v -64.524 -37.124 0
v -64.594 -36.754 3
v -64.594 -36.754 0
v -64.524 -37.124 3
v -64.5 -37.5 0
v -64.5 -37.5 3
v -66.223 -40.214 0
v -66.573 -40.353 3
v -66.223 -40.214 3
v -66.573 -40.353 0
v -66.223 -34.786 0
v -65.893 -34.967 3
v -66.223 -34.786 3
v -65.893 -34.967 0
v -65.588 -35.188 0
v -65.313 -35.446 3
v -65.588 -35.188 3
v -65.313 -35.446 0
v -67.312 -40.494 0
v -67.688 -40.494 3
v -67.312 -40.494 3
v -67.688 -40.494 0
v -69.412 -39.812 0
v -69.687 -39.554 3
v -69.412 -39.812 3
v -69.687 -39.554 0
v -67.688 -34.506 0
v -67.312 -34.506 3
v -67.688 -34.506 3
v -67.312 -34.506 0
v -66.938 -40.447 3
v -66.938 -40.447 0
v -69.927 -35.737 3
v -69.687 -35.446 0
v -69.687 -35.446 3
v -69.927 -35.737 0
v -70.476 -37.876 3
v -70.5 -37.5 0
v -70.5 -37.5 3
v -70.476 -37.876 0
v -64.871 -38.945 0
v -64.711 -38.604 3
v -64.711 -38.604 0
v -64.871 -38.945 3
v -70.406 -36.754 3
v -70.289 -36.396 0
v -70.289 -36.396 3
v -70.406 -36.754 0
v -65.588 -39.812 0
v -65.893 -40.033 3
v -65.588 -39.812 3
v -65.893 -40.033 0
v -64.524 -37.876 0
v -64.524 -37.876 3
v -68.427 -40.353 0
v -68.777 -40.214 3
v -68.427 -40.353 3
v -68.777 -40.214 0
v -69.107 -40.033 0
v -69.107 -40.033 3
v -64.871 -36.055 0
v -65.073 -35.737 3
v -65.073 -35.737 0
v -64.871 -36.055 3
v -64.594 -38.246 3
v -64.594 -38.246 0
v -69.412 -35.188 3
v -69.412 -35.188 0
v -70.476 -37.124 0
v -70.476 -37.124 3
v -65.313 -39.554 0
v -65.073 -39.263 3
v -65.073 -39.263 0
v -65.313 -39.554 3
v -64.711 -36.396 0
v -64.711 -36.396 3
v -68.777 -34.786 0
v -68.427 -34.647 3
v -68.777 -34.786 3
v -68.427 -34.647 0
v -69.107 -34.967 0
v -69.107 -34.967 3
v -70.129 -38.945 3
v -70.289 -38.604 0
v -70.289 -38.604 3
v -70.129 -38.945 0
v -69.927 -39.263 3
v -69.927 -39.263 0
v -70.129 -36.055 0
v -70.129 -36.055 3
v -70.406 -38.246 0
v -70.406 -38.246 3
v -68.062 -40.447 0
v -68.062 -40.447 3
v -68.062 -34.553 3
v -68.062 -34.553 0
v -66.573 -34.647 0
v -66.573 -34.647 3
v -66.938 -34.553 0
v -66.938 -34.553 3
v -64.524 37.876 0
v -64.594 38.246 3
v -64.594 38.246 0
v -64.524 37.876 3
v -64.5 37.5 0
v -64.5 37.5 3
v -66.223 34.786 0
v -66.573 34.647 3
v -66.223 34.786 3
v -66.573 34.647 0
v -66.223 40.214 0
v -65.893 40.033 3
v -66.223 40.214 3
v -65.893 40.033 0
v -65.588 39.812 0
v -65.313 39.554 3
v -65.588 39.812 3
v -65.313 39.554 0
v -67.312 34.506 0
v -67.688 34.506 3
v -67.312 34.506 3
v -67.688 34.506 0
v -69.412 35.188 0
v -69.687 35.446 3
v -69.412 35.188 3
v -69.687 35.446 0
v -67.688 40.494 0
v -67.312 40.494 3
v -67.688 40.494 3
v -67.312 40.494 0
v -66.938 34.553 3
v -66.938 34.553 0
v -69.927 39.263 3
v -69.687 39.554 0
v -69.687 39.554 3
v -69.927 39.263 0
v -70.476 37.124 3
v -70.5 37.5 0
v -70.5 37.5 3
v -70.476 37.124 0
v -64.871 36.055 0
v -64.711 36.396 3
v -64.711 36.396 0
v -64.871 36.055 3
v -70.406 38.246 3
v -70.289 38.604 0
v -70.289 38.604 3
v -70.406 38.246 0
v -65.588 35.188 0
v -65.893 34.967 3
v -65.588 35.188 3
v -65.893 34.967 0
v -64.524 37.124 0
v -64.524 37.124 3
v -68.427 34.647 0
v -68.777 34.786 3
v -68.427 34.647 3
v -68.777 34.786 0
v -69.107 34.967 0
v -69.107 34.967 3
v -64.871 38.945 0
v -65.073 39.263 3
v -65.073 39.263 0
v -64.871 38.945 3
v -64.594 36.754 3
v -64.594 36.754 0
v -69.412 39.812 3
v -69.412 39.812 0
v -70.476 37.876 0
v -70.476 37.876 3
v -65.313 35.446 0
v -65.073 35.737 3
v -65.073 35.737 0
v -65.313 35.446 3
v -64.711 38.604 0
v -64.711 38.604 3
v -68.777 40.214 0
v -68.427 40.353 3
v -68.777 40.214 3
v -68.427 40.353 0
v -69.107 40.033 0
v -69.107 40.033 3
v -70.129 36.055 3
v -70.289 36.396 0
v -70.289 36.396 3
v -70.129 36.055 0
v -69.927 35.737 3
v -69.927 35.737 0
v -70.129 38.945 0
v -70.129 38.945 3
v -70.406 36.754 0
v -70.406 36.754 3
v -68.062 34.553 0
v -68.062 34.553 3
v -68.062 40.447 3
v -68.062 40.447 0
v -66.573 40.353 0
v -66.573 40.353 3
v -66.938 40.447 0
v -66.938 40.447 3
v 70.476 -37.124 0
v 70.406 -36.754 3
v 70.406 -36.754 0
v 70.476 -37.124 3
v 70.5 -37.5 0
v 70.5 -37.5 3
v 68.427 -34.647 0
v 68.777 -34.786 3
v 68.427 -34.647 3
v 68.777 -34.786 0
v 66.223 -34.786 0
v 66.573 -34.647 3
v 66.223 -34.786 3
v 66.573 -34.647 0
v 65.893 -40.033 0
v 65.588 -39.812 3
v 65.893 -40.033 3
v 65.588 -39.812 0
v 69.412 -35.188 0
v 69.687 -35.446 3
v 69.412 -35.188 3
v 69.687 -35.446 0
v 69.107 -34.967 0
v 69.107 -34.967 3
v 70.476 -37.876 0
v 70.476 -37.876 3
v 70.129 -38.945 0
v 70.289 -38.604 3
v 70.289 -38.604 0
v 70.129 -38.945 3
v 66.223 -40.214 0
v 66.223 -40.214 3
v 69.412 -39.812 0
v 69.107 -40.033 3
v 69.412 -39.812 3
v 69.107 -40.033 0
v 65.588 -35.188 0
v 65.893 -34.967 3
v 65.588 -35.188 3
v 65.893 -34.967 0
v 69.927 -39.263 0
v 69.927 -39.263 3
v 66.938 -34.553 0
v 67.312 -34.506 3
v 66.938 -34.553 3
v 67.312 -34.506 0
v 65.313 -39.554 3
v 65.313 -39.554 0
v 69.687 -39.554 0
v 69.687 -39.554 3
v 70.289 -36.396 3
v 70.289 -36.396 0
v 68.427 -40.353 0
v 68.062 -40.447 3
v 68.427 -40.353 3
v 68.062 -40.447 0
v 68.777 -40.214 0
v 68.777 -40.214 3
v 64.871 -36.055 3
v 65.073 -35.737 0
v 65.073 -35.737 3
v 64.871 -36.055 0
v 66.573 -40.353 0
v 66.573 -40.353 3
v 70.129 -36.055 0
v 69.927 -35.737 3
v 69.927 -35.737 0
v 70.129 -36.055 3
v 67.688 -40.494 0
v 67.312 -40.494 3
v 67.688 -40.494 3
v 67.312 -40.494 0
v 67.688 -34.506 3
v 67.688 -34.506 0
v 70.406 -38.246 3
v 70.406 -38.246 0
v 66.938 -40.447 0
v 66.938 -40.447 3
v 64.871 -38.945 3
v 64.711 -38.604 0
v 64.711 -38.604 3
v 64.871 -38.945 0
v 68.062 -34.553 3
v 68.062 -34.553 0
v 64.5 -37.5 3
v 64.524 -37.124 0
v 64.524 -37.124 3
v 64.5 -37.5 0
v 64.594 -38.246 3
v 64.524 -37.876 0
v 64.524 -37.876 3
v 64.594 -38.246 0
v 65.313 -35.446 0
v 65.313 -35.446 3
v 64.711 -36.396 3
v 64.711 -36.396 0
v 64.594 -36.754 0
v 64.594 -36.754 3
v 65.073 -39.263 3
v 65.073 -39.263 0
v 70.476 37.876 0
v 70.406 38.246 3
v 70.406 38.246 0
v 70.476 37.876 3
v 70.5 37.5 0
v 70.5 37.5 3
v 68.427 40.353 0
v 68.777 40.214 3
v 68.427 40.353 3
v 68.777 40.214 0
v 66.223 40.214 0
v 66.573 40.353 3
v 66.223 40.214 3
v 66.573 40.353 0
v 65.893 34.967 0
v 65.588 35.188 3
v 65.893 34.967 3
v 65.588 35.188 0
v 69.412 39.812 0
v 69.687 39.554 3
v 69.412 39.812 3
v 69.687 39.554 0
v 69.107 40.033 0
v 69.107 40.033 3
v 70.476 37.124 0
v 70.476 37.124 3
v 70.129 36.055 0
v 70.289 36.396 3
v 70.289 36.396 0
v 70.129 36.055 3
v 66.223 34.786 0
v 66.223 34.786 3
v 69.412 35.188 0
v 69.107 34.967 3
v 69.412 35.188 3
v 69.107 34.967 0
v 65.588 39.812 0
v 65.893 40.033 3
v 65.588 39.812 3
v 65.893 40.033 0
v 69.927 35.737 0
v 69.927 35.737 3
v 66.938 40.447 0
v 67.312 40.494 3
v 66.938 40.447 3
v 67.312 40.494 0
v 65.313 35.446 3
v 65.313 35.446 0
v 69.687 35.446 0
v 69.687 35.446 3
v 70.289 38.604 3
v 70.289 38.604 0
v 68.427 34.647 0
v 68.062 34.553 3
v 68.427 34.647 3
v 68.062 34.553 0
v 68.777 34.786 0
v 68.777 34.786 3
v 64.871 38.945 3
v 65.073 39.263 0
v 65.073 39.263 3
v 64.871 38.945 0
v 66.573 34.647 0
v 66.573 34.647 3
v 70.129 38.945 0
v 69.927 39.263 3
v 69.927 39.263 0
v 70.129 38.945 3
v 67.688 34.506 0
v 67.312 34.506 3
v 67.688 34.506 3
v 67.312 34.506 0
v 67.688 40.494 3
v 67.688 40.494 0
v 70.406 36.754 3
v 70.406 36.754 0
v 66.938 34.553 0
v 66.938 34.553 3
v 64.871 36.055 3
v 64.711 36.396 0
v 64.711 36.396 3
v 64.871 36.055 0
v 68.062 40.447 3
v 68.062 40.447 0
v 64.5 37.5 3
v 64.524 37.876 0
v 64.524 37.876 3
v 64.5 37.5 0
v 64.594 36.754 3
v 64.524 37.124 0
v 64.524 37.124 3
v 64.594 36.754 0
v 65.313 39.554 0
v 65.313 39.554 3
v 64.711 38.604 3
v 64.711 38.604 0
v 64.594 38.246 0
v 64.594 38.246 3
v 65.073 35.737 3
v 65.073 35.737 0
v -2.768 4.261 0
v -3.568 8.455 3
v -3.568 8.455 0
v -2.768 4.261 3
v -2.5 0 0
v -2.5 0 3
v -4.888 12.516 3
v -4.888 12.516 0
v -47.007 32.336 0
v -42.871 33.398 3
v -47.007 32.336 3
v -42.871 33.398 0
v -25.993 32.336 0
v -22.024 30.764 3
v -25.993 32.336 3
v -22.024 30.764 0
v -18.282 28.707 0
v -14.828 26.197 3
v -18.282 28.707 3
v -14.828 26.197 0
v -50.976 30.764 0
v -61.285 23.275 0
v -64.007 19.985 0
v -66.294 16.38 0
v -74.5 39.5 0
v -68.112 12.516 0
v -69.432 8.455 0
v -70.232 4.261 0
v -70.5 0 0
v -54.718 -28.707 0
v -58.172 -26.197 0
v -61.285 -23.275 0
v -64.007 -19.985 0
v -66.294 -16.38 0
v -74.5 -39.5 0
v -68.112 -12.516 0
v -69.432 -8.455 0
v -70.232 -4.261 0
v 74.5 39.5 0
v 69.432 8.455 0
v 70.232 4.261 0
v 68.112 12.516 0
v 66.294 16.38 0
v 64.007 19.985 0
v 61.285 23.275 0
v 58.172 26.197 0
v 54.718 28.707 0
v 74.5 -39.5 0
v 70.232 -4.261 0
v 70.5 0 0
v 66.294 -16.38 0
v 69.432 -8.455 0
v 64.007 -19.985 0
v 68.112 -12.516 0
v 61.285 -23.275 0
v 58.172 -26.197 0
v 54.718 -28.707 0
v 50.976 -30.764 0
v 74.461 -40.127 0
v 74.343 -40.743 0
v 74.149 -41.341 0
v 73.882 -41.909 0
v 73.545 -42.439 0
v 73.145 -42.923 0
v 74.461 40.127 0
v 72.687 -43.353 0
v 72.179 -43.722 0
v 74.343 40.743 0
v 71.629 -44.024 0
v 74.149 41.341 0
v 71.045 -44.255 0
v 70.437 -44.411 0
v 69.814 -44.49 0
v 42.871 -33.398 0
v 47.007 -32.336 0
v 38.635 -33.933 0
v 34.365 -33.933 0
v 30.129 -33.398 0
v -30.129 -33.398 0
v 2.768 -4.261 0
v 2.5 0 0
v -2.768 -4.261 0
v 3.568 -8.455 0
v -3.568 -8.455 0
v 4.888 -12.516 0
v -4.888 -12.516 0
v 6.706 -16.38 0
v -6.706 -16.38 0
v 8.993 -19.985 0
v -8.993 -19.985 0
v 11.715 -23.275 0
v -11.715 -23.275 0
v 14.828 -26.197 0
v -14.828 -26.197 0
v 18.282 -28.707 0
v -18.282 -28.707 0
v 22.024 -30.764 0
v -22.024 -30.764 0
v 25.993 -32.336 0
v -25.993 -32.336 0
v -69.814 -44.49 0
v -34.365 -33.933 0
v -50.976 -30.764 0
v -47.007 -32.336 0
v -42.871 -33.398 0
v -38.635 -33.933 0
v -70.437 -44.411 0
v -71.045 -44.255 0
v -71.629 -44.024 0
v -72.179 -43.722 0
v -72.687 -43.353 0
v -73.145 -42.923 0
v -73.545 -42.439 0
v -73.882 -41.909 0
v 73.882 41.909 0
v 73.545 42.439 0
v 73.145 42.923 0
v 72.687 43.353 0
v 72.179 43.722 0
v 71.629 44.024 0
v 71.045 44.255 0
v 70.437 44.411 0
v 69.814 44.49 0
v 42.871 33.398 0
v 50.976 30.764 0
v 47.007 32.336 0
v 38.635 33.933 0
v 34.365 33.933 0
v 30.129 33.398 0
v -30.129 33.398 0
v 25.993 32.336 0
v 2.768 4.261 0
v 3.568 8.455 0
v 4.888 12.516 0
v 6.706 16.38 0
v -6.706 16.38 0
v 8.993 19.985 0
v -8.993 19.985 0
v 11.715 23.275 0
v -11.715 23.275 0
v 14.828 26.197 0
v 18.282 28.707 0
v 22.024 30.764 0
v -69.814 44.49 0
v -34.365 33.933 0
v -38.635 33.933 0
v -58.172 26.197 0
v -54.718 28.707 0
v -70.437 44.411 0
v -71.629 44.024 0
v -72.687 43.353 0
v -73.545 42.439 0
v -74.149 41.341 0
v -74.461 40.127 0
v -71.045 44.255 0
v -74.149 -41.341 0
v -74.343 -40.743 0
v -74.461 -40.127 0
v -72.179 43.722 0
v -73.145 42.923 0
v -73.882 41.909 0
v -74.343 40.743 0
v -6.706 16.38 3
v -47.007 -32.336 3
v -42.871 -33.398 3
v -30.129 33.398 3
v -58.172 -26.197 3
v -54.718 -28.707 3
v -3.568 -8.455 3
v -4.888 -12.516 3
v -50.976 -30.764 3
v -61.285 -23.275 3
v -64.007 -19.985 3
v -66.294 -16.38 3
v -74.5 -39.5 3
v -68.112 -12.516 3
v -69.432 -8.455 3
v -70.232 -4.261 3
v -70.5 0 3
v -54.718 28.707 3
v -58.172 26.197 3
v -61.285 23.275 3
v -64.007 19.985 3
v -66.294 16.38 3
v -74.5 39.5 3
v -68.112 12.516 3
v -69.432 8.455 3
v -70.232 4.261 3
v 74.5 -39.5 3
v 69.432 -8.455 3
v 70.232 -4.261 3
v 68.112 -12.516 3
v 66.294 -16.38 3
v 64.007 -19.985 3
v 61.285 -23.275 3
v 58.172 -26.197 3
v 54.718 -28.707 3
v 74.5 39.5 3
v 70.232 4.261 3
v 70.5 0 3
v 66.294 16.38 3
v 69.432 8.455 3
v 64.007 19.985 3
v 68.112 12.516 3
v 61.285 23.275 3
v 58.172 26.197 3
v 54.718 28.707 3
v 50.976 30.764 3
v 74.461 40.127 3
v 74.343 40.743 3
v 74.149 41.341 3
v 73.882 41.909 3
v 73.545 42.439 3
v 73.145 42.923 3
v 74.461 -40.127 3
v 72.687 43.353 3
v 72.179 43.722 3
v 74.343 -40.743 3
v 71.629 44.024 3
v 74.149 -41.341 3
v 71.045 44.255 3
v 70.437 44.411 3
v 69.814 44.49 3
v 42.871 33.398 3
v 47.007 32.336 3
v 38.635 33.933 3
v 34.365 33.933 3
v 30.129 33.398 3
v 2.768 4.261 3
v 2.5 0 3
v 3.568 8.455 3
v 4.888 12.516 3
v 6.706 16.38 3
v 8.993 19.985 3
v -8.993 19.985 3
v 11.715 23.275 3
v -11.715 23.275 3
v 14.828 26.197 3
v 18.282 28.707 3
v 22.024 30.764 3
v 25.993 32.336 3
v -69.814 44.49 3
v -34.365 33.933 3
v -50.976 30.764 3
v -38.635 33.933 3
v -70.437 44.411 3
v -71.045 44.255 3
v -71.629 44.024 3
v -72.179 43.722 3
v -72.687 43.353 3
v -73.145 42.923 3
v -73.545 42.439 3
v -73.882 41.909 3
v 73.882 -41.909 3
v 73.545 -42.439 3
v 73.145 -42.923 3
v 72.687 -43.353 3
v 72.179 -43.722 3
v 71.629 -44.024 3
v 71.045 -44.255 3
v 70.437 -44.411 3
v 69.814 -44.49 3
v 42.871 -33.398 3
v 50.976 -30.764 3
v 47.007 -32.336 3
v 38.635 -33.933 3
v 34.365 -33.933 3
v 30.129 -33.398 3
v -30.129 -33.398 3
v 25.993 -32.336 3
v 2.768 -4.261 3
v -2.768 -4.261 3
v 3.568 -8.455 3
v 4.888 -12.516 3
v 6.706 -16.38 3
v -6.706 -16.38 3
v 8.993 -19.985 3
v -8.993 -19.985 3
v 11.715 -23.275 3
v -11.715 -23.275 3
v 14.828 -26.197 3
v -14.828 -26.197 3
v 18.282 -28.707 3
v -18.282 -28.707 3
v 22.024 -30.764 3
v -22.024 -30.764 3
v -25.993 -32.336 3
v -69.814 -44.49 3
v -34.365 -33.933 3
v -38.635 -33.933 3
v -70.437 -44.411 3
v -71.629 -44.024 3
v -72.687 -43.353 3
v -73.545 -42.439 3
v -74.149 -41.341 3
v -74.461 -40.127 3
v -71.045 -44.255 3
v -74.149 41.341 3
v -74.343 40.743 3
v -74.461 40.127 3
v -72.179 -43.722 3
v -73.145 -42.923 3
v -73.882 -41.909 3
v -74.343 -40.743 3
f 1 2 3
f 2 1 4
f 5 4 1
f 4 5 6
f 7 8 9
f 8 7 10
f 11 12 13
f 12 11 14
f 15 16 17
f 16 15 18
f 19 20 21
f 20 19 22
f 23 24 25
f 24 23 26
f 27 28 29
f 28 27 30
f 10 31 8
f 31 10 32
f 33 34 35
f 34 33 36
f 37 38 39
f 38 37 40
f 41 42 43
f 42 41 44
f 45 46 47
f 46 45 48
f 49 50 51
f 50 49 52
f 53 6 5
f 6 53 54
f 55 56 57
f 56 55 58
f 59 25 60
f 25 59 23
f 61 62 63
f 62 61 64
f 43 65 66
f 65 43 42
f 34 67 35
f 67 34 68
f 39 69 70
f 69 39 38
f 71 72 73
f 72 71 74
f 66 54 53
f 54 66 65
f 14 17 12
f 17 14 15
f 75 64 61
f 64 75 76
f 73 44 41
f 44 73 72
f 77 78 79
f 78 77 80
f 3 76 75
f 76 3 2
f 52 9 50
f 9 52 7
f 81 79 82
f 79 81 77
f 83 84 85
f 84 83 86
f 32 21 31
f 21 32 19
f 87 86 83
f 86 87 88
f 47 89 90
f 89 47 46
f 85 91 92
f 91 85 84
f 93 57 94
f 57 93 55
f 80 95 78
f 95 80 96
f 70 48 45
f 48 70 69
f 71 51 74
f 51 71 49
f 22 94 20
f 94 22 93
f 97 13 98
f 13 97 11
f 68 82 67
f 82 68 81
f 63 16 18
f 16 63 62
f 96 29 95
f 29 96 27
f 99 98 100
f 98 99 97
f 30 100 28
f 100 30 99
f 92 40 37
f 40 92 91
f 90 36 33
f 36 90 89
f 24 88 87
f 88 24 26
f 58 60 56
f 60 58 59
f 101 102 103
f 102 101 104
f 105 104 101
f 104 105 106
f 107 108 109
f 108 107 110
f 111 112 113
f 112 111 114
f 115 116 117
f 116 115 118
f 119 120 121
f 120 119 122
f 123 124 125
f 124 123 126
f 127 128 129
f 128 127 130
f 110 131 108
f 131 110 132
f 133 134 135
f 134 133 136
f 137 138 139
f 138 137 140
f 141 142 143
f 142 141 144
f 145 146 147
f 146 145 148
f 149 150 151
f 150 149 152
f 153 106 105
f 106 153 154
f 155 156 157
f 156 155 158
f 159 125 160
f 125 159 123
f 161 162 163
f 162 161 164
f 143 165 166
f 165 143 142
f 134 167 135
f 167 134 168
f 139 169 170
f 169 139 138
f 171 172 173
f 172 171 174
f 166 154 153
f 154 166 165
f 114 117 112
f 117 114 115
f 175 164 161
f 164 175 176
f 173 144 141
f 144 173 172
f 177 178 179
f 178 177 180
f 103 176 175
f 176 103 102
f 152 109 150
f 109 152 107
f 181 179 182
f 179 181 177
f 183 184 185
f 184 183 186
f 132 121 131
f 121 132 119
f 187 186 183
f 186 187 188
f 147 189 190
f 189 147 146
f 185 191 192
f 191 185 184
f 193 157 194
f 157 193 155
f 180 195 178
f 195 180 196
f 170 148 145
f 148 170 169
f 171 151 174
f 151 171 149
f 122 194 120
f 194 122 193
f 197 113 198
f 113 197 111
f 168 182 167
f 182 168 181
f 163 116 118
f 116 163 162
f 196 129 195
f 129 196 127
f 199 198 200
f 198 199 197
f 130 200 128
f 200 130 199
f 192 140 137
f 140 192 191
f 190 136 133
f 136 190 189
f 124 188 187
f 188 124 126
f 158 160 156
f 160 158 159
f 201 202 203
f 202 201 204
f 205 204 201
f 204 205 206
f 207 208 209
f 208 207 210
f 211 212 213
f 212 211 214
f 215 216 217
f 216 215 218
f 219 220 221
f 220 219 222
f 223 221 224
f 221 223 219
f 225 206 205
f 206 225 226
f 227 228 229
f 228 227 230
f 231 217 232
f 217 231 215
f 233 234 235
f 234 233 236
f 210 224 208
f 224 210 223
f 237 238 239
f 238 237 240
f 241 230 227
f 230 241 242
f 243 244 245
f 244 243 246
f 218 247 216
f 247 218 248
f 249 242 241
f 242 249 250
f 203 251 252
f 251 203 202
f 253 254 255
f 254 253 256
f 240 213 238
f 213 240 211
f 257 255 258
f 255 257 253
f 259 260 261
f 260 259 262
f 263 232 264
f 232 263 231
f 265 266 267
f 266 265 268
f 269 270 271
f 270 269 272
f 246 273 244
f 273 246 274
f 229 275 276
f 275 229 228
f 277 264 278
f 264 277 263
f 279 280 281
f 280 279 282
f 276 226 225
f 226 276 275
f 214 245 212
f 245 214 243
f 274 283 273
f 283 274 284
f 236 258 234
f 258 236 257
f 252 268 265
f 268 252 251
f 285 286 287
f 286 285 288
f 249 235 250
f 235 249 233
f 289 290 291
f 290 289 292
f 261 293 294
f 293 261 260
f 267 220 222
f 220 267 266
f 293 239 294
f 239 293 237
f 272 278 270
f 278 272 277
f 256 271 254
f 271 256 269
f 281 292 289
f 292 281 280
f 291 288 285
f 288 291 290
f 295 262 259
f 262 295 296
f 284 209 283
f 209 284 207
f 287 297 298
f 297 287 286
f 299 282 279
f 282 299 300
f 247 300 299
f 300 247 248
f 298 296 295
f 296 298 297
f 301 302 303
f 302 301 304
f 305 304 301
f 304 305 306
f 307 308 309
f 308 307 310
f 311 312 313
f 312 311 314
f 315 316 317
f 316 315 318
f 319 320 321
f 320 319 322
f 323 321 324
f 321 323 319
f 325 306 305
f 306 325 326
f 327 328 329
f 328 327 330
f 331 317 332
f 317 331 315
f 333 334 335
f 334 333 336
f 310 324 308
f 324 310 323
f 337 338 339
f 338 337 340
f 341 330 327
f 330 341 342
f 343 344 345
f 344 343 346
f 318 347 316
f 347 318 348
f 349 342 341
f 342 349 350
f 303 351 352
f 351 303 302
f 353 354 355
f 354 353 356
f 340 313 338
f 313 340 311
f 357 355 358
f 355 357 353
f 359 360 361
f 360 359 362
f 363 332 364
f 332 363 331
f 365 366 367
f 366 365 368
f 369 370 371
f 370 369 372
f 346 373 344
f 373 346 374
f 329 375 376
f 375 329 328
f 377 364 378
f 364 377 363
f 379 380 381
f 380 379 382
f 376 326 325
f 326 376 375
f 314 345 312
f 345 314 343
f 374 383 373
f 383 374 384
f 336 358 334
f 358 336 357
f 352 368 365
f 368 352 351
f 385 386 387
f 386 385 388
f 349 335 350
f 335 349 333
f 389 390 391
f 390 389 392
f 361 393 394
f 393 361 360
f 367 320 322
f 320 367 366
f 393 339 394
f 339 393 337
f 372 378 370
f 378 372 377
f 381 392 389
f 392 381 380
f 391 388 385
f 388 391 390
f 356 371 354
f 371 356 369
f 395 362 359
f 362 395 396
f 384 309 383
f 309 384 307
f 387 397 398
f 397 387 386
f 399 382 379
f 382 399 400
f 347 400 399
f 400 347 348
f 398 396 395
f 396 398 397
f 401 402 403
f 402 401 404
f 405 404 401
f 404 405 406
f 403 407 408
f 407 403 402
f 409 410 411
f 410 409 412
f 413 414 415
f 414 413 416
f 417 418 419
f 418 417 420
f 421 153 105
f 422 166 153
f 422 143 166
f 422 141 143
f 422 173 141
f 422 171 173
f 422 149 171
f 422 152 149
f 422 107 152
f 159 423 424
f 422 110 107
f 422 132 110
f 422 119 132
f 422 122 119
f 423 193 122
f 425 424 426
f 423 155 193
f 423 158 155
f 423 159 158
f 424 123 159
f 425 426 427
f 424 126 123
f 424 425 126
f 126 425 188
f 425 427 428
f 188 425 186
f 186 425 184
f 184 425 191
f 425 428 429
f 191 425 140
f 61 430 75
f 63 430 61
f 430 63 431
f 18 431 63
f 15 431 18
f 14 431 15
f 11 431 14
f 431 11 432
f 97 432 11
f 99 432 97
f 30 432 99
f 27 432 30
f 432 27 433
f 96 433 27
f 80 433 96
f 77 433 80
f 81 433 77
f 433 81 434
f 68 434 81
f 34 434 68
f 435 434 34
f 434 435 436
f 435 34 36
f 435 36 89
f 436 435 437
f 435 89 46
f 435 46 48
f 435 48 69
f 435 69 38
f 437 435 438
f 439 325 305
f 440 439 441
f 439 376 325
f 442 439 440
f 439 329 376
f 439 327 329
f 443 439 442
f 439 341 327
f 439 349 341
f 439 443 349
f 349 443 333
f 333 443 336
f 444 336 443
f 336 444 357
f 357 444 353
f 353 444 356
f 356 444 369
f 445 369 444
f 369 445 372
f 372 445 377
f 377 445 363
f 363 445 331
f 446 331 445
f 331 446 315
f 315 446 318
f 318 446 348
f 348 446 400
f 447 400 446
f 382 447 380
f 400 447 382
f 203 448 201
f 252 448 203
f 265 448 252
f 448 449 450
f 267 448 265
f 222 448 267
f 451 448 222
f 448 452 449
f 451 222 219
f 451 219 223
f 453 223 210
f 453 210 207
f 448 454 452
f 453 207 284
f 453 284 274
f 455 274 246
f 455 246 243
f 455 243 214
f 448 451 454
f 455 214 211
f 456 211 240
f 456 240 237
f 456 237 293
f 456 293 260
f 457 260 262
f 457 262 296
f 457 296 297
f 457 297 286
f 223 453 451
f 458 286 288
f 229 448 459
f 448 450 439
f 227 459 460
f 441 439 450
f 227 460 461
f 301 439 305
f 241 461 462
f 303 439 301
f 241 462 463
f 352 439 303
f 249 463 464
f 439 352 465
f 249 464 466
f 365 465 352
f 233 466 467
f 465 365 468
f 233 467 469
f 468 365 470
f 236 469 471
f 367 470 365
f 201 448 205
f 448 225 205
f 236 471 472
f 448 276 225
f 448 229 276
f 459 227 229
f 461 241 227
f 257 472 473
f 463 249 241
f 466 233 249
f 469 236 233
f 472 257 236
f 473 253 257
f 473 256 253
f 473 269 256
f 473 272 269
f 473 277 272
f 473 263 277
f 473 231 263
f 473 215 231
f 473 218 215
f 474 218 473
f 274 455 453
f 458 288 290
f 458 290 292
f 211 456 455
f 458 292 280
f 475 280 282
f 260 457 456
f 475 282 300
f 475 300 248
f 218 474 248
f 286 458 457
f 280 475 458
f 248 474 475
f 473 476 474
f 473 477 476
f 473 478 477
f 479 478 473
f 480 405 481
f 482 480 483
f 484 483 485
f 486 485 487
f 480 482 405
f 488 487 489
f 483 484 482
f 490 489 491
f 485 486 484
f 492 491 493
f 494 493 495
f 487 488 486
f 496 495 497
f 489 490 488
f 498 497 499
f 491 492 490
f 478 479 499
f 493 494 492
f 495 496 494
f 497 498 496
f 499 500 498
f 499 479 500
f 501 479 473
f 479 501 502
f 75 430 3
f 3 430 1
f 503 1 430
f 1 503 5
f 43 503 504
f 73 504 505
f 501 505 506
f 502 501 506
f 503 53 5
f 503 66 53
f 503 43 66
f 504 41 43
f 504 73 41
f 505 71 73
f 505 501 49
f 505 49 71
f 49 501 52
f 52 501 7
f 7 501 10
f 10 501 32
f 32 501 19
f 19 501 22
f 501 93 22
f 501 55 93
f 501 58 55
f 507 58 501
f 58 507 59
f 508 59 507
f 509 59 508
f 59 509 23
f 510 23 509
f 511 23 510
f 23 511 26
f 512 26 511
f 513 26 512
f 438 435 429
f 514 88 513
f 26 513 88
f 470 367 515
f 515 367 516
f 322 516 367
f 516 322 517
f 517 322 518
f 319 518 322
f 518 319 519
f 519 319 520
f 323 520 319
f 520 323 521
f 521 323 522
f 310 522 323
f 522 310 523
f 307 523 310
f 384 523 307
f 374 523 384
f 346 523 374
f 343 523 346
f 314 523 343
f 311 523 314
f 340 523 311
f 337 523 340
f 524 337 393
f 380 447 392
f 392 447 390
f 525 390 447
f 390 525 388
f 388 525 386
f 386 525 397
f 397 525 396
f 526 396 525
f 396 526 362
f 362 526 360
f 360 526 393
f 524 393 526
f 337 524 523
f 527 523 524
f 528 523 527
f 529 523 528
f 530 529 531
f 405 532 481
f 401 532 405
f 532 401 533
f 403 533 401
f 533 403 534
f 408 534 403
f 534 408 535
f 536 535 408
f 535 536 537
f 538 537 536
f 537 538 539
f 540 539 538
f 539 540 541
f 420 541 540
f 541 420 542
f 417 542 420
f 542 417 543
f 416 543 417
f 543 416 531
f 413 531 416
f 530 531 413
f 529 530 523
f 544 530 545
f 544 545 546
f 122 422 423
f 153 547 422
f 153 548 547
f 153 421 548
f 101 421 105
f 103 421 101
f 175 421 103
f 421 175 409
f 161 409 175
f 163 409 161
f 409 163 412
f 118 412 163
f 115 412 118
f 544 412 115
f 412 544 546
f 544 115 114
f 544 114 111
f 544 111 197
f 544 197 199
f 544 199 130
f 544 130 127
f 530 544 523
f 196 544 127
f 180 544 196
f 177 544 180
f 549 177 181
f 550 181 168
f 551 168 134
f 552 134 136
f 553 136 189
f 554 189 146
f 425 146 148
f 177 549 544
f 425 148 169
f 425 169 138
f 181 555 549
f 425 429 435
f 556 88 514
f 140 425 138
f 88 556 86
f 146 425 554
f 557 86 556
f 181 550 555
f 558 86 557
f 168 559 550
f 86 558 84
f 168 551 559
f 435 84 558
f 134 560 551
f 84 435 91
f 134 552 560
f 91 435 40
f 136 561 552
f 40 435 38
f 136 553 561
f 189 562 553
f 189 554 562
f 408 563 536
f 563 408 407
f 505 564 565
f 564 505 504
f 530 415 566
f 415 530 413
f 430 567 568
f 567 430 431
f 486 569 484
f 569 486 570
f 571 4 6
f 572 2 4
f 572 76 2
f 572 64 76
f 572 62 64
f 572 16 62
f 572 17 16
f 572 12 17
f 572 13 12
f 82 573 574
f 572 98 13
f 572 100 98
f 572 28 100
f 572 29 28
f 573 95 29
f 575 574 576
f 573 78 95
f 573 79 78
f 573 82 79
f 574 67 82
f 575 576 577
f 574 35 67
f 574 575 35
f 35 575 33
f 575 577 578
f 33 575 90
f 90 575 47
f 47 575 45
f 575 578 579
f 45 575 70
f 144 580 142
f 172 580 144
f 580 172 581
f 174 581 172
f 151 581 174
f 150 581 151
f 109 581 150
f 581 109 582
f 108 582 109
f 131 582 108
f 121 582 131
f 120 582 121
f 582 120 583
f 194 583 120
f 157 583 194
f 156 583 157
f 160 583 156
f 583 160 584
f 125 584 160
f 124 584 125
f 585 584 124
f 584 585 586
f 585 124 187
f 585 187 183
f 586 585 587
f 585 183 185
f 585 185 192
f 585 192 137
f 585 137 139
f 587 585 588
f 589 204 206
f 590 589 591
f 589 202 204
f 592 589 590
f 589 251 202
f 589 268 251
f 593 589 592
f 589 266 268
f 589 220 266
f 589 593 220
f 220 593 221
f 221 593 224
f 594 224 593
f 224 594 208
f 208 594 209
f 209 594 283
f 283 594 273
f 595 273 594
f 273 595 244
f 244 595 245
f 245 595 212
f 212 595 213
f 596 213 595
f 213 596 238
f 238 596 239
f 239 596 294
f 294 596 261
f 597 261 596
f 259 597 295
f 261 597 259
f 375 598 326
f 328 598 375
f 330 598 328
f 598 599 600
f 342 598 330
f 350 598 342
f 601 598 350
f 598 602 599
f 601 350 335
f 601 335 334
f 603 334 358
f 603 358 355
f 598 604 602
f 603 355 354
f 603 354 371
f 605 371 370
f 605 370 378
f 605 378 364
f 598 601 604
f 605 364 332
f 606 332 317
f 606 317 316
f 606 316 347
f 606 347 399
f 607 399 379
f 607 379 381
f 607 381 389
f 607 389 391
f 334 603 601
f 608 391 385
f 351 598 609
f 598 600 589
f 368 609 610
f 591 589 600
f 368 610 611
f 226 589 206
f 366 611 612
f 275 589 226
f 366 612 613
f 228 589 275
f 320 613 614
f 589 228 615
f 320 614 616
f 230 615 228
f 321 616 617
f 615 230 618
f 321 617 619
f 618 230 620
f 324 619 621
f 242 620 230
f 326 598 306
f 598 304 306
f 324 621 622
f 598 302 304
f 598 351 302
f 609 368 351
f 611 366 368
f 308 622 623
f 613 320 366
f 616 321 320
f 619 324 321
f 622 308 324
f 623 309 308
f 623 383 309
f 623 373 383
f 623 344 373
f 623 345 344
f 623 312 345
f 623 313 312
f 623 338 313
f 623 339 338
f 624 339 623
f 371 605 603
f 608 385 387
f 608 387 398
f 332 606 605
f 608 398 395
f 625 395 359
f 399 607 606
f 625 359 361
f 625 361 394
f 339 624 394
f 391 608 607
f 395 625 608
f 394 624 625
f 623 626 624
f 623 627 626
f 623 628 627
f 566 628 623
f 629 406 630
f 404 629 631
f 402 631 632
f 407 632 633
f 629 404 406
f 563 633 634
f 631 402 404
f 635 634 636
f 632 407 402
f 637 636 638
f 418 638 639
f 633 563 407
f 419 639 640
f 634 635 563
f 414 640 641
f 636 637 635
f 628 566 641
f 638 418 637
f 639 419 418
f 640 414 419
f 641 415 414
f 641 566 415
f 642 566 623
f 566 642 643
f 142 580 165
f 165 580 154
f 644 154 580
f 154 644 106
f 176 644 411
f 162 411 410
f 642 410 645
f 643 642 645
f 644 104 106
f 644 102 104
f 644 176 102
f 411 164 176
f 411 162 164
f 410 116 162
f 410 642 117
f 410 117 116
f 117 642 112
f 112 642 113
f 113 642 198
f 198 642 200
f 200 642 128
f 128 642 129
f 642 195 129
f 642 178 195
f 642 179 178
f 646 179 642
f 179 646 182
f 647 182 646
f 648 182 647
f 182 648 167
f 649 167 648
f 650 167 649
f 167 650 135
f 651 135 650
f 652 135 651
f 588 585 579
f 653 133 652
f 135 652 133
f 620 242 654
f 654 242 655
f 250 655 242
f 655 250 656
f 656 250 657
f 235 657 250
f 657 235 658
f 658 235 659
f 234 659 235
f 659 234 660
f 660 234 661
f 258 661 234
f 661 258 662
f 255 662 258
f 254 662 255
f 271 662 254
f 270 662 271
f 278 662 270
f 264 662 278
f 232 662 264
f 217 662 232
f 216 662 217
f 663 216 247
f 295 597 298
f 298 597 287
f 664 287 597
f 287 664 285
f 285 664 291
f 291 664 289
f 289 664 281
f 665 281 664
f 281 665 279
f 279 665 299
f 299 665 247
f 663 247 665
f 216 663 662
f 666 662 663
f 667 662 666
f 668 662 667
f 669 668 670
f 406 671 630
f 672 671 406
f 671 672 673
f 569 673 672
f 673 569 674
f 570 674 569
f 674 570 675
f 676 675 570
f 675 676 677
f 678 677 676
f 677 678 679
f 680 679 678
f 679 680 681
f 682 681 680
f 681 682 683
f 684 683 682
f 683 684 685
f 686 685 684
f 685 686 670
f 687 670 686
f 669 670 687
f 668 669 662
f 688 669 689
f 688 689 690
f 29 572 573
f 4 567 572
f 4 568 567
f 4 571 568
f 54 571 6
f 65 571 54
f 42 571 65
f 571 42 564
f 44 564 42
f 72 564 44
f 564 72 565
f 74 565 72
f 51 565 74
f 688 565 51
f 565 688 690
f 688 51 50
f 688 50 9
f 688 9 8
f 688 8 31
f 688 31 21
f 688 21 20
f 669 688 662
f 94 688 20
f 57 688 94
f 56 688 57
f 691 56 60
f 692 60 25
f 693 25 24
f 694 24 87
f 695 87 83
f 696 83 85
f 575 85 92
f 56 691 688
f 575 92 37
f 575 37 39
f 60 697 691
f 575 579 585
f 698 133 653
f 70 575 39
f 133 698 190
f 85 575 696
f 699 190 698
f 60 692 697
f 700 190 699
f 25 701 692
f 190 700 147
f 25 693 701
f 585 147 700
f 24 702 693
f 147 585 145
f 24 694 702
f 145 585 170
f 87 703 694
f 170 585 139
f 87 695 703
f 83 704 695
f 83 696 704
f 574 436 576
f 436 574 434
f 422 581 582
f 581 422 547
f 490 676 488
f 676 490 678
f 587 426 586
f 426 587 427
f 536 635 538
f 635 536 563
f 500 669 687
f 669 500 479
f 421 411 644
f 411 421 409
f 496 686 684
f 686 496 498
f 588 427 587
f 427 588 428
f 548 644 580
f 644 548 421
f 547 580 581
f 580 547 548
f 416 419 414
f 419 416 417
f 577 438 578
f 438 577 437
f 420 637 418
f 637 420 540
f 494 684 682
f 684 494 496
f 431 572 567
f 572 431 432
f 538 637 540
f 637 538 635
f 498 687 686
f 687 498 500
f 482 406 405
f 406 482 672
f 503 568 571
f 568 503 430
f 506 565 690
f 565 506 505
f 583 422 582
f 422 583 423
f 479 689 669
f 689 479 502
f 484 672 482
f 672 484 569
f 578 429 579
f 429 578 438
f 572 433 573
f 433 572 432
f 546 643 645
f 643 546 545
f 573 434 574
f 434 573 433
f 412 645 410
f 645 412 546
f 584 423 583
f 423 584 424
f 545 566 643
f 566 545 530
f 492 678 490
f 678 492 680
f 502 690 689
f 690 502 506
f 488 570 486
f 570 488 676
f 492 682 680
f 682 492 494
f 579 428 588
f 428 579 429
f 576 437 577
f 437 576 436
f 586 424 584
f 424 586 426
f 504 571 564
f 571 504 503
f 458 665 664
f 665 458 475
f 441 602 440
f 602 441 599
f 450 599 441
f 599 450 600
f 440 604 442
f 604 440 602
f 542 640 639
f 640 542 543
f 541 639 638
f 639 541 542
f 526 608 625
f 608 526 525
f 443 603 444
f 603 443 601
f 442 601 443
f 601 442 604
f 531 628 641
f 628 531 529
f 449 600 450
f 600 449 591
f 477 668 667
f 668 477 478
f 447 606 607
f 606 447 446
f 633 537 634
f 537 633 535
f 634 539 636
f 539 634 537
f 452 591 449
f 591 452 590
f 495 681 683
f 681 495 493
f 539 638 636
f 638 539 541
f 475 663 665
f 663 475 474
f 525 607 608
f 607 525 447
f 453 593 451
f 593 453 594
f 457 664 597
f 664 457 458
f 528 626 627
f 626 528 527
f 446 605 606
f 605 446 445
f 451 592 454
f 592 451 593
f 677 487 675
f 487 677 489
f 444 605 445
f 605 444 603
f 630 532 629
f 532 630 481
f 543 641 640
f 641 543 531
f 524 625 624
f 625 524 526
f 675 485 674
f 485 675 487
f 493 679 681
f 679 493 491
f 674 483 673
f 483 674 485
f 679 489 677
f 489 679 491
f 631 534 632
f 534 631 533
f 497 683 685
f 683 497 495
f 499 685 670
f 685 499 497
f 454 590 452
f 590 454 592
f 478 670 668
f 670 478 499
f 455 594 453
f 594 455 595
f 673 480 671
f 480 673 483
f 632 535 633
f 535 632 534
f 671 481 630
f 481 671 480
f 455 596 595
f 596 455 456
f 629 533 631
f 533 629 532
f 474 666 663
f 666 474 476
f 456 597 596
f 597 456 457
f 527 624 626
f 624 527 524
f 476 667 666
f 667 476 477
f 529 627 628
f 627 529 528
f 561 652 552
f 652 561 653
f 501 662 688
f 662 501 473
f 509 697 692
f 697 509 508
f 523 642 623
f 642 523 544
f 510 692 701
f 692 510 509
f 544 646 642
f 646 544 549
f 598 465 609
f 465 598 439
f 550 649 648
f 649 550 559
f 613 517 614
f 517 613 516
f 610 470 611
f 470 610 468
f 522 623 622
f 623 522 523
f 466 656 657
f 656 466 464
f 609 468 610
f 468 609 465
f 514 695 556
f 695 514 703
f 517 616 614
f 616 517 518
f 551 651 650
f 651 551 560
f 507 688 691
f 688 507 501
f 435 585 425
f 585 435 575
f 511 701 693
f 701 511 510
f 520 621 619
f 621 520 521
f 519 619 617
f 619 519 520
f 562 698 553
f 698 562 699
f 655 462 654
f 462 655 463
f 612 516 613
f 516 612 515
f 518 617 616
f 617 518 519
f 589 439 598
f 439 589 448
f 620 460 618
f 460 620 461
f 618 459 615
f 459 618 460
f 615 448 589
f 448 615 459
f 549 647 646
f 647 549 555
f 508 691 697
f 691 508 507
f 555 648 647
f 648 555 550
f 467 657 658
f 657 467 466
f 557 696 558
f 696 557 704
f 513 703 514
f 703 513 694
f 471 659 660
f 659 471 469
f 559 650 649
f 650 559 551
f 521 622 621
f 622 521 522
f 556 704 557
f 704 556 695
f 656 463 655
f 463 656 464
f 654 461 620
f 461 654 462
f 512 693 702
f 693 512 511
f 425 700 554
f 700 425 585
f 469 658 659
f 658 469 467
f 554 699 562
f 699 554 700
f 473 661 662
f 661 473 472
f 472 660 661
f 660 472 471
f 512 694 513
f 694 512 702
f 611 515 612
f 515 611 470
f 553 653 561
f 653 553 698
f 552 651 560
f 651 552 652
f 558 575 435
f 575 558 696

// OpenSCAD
$fn = 50;


difference() {
	union() {
		hull() {
			translate(v = [-69.5000000000, 39.5000000000, 0]) {
				cylinder(h = 3, r = 5);
			}
			translate(v = [69.5000000000, 39.5000000000, 0]) {
				cylinder(h = 3, r = 5);
			}
			translate(v = [-69.5000000000, -39.5000000000, 0]) {
				cylinder(h = 3, r = 5);
			}
			translate(v = [69.5000000000, -39.5000000000, 0]) {
				cylinder(h = 3, r = 5);
			}
		}
	}
	union() {
		#translate(v = [-67.5000000000, -37.5000000000, -100.0000000000]) {
			cylinder(h = 200, r = 3.0000000000);
		}
		#translate(v = [-67.5000000000, 37.5000000000, -100.0000000000]) {
			cylinder(h = 200, r = 3.0000000000);
		}
		#translate(v = [67.5000000000, -37.5000000000, -100.0000000000]) {
			cylinder(h = 200, r = 3.0000000000);
		}
		#translate(v = [67.5000000000, 37.5000000000, -100.0000000000]) {
			cylinder(h = 200, r = 3.0000000000);
		}
		#translate(v = [-36.5000000000, 0, 0]) {
			cylinder(h = 3, r = 34.0000000000);
		}
		#translate(v = [36.5000000000, 0, 0]) {
			cylinder(h = 3, r = 34.0000000000);
		}
	}
}
